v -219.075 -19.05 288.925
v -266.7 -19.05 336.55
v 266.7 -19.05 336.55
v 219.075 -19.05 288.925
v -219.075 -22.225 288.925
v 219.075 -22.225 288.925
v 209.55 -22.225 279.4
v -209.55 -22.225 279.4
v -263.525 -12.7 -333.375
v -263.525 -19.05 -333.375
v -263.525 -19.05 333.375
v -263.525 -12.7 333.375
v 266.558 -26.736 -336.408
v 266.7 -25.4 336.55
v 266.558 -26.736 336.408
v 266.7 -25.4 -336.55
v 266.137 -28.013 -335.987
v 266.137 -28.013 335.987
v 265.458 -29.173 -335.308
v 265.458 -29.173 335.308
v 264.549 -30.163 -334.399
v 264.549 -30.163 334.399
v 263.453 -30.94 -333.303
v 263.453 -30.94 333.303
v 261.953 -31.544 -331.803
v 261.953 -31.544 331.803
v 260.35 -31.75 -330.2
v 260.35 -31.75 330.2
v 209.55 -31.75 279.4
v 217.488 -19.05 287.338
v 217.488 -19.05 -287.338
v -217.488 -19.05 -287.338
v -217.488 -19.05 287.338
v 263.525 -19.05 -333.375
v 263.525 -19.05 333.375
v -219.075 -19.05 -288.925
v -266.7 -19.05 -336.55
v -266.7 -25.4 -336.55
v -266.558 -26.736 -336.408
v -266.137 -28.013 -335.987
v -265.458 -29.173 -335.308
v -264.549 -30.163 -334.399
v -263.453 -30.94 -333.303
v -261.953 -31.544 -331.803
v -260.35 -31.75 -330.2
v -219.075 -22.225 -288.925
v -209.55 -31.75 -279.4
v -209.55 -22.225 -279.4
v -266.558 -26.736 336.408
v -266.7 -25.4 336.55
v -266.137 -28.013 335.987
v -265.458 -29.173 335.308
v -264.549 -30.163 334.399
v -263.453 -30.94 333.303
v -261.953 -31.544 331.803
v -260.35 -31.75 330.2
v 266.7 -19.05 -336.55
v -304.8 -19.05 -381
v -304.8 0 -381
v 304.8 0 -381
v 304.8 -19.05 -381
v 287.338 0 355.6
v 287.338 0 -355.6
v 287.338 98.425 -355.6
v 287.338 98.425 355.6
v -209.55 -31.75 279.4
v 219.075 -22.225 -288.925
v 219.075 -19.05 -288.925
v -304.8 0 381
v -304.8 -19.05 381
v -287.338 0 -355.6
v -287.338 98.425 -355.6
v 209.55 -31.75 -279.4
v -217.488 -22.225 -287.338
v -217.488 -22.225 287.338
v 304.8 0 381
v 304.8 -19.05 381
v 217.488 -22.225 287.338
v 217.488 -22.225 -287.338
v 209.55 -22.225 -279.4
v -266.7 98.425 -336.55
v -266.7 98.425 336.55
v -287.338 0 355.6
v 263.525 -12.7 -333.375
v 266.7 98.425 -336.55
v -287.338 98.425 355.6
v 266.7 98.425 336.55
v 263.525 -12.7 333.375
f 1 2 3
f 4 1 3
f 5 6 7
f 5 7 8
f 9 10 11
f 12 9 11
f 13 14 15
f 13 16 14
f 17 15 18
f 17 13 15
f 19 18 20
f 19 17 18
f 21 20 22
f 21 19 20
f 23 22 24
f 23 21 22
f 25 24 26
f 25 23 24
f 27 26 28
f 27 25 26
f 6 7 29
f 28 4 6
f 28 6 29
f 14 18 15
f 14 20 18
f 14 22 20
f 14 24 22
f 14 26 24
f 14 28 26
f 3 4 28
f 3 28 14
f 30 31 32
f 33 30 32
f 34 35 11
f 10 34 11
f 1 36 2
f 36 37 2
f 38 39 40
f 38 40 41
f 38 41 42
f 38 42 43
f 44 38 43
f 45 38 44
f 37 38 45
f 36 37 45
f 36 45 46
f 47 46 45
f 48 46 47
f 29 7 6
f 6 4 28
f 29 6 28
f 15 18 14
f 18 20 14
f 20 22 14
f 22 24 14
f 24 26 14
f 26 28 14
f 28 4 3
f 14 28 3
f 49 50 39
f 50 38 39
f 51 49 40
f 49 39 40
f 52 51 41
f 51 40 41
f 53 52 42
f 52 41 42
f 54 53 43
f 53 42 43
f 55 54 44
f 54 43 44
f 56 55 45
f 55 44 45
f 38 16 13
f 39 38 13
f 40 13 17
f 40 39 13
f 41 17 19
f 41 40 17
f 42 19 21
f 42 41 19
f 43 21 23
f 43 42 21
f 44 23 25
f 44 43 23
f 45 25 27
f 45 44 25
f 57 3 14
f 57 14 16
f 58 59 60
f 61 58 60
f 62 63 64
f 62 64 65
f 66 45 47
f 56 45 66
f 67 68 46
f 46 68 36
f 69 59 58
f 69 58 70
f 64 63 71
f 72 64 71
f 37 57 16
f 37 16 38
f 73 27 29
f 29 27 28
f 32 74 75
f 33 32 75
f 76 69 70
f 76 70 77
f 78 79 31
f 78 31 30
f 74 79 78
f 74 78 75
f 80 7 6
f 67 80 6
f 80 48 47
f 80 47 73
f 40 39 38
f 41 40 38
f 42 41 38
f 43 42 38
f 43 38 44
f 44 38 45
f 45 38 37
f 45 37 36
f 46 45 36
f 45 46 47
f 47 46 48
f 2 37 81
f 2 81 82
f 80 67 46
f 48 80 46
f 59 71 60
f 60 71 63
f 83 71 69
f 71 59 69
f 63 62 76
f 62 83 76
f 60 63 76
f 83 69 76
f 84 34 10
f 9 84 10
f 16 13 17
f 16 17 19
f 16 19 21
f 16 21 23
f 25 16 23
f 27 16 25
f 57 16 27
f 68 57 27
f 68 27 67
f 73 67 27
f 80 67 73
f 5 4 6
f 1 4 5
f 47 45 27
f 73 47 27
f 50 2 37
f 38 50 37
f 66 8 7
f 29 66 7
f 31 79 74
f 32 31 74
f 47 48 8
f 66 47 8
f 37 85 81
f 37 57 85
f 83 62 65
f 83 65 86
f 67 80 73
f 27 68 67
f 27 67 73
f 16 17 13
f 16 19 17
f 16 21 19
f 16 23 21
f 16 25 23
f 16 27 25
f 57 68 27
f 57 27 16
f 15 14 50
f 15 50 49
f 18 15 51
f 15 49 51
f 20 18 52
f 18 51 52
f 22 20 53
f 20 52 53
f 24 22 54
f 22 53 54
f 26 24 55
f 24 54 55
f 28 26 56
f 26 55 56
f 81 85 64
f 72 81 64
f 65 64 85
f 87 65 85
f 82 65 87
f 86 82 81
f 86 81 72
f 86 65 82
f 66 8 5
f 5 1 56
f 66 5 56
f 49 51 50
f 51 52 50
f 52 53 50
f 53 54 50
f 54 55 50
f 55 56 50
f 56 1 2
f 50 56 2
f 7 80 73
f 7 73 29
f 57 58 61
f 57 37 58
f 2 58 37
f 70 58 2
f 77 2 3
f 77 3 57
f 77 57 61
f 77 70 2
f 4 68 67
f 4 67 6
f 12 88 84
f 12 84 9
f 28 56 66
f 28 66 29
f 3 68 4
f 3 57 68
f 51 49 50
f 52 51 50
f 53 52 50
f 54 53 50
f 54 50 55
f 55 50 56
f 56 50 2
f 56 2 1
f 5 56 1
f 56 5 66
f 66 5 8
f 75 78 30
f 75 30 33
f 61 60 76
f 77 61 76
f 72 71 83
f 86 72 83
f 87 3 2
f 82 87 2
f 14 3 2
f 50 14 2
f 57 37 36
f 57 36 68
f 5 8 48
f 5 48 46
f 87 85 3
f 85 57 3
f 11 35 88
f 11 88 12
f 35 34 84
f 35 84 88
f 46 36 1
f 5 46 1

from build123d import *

# Parameters (mm, degrees)
F0_W      = 609.6
F0_H      = 762
F0_W_2    = 533.4
F0_H_2    = 673.1
F1_DEPTH  = 19.05
F2_W      = 574.675
F2_H      = 711.2
F2_W_2    = 533.4
F2_H_2    = 673.1
F3_DEPTH  = 98.425
F5_DEPTH  = 12.7
F6_DEPTH  = 12.7
F7_R      = 6.35
F7_2_R    = 6.35
F8_W      = 438.15
F8_H      = 19.05
F9_DEPTH  = 3.175
F10_W     = 19.05
F10_H     = 577.85
F11_DEPTH = 3.175
F14_W     = 434.975
F14_H     = 574.675
F15_DEPTH = 3.175
F16_W     = 530.225
F16_H     = 669.925
F17_DEPTH = 6.35
F18_W     = 527.05
F18_H     = 666.75
F19_DEPTH = 6.35


# Not quite as in the source:
# - a feature names something its author has since deleted; it is built from what else it names


with BuildPart() as f1:
    # F0 (on Front) → F1 (new body)
    with BuildSketch(Plane.XZ):
        Rectangle(F0_W, F0_H)
        Rectangle(F0_W_2, F0_H_2, mode=Mode.SUBTRACT)
    extrude(amount=F1_DEPTH)

    # F2 (on face) → F3 (join)
    with BuildSketch(Plane(origin=(0, 0, 0), x_dir=(-1, 0, 0), z_dir=(0, 1, 0))):
        Rectangle(F2_W, F2_H)
        Rectangle(F2_W_2, F2_H_2, mode=Mode.SUBTRACT)
    extrude(amount=F3_DEPTH)


with BuildPart() as f5:
    # F4 (on face) → F5 (new body)
    with BuildSketch(Plane.XZ.offset(19.05)):
        Polygon((209.55, 279.4), (266.7, 336.55), (-266.7, 336.55), (-209.55, 279.4), align=None)
    extrude(amount=F5_DEPTH)

    # F7
    f7_edges = [f5.edges().sort_by_distance(p)[0] for p in [
        (0, -31.75, 336.55),
    ]]
    fillet(f7_edges, radius=F7_R)


with BuildPart() as f6:
    # F4 (on face) → F6 (new body)
    with BuildSketch(Plane.XZ.offset(19.05)):
        Polygon((-209.55, 279.4), (-266.7, 336.55), (-266.7, -336.55), (-209.55, -279.4), align=None)
    extrude(amount=F6_DEPTH)

    # F7#2
    f7_2_edges = [f6.edges().sort_by_distance(p)[0] for p in [
        (-266.7, -31.75, 0),
    ]]
    fillet(f7_2_edges, radius=F7_2_R)


with BuildPart() as f9_tool:
    # F8 (on face) → F9 (new body)
    with BuildSketch(Plane(origin=(0, -19.05, 0), x_dir=(-1, 0, 0), z_dir=(0, 1, 0))):
        with Locations((0, 279.4)):
            Rectangle(F8_W, F8_H)
    extrude(amount=-F9_DEPTH)


with BuildPart() as f5_1:
    add(f5.part)

    # F9: cut by f9_tool
    add(f9_tool.part, mode=Mode.SUBTRACT)


with BuildPart() as f6_1:
    add(f6.part)

    # F9: cut by f9_tool
    add(f9_tool.part, mode=Mode.SUBTRACT)

    # F10 (on face) → F11 (cut)
    with BuildSketch(Plane(origin=(0, -19.05, 0), x_dir=(-1, 0, 0), z_dir=(0, 1, 0))):
        with Locations((209.55, 0)):
            Rectangle(F10_W, F10_H)
    extrude(amount=-F11_DEPTH, mode=Mode.SUBTRACT)


with BuildPart() as f12_1:
    # F12: instance of F6
    add(f6_1.part.mirror(Plane.YZ))


with BuildPart() as f13_1:
    # F13: instance of F5
    add(f5_1.part.mirror(Plane.XY))


with BuildPart() as f15:
    # F14 (on face) → F15 (new body)
    with BuildSketch(Plane(origin=(0, -22.225, 0), x_dir=(-1, 0, 0), z_dir=(0, 1, 0))):
        Rectangle(F14_W, F14_H)
    extrude(amount=F15_DEPTH)


with BuildPart() as f17:
    # F16 (on face) → F17 (new body)
    with BuildSketch(Plane(origin=(0, -19.05, 0), x_dir=(-1, 0, 0), z_dir=(0, 1, 0))):
        Rectangle(F16_W, F16_H)
    extrude(amount=F17_DEPTH)


with BuildPart() as f19:
    # F18 (on face) → F19 (new body)
    with BuildSketch(Plane(origin=(0, -19.05, 0), x_dir=(-1, 0, 0), z_dir=(0, 1, 0))):
        Rectangle(F18_W, F18_H)
    extrude(amount=F19_DEPTH)


solid = Compound([f1.part, f5_1.part, f6_1.part, f12_1.part, f13_1.part, f15.part, f19.part])
